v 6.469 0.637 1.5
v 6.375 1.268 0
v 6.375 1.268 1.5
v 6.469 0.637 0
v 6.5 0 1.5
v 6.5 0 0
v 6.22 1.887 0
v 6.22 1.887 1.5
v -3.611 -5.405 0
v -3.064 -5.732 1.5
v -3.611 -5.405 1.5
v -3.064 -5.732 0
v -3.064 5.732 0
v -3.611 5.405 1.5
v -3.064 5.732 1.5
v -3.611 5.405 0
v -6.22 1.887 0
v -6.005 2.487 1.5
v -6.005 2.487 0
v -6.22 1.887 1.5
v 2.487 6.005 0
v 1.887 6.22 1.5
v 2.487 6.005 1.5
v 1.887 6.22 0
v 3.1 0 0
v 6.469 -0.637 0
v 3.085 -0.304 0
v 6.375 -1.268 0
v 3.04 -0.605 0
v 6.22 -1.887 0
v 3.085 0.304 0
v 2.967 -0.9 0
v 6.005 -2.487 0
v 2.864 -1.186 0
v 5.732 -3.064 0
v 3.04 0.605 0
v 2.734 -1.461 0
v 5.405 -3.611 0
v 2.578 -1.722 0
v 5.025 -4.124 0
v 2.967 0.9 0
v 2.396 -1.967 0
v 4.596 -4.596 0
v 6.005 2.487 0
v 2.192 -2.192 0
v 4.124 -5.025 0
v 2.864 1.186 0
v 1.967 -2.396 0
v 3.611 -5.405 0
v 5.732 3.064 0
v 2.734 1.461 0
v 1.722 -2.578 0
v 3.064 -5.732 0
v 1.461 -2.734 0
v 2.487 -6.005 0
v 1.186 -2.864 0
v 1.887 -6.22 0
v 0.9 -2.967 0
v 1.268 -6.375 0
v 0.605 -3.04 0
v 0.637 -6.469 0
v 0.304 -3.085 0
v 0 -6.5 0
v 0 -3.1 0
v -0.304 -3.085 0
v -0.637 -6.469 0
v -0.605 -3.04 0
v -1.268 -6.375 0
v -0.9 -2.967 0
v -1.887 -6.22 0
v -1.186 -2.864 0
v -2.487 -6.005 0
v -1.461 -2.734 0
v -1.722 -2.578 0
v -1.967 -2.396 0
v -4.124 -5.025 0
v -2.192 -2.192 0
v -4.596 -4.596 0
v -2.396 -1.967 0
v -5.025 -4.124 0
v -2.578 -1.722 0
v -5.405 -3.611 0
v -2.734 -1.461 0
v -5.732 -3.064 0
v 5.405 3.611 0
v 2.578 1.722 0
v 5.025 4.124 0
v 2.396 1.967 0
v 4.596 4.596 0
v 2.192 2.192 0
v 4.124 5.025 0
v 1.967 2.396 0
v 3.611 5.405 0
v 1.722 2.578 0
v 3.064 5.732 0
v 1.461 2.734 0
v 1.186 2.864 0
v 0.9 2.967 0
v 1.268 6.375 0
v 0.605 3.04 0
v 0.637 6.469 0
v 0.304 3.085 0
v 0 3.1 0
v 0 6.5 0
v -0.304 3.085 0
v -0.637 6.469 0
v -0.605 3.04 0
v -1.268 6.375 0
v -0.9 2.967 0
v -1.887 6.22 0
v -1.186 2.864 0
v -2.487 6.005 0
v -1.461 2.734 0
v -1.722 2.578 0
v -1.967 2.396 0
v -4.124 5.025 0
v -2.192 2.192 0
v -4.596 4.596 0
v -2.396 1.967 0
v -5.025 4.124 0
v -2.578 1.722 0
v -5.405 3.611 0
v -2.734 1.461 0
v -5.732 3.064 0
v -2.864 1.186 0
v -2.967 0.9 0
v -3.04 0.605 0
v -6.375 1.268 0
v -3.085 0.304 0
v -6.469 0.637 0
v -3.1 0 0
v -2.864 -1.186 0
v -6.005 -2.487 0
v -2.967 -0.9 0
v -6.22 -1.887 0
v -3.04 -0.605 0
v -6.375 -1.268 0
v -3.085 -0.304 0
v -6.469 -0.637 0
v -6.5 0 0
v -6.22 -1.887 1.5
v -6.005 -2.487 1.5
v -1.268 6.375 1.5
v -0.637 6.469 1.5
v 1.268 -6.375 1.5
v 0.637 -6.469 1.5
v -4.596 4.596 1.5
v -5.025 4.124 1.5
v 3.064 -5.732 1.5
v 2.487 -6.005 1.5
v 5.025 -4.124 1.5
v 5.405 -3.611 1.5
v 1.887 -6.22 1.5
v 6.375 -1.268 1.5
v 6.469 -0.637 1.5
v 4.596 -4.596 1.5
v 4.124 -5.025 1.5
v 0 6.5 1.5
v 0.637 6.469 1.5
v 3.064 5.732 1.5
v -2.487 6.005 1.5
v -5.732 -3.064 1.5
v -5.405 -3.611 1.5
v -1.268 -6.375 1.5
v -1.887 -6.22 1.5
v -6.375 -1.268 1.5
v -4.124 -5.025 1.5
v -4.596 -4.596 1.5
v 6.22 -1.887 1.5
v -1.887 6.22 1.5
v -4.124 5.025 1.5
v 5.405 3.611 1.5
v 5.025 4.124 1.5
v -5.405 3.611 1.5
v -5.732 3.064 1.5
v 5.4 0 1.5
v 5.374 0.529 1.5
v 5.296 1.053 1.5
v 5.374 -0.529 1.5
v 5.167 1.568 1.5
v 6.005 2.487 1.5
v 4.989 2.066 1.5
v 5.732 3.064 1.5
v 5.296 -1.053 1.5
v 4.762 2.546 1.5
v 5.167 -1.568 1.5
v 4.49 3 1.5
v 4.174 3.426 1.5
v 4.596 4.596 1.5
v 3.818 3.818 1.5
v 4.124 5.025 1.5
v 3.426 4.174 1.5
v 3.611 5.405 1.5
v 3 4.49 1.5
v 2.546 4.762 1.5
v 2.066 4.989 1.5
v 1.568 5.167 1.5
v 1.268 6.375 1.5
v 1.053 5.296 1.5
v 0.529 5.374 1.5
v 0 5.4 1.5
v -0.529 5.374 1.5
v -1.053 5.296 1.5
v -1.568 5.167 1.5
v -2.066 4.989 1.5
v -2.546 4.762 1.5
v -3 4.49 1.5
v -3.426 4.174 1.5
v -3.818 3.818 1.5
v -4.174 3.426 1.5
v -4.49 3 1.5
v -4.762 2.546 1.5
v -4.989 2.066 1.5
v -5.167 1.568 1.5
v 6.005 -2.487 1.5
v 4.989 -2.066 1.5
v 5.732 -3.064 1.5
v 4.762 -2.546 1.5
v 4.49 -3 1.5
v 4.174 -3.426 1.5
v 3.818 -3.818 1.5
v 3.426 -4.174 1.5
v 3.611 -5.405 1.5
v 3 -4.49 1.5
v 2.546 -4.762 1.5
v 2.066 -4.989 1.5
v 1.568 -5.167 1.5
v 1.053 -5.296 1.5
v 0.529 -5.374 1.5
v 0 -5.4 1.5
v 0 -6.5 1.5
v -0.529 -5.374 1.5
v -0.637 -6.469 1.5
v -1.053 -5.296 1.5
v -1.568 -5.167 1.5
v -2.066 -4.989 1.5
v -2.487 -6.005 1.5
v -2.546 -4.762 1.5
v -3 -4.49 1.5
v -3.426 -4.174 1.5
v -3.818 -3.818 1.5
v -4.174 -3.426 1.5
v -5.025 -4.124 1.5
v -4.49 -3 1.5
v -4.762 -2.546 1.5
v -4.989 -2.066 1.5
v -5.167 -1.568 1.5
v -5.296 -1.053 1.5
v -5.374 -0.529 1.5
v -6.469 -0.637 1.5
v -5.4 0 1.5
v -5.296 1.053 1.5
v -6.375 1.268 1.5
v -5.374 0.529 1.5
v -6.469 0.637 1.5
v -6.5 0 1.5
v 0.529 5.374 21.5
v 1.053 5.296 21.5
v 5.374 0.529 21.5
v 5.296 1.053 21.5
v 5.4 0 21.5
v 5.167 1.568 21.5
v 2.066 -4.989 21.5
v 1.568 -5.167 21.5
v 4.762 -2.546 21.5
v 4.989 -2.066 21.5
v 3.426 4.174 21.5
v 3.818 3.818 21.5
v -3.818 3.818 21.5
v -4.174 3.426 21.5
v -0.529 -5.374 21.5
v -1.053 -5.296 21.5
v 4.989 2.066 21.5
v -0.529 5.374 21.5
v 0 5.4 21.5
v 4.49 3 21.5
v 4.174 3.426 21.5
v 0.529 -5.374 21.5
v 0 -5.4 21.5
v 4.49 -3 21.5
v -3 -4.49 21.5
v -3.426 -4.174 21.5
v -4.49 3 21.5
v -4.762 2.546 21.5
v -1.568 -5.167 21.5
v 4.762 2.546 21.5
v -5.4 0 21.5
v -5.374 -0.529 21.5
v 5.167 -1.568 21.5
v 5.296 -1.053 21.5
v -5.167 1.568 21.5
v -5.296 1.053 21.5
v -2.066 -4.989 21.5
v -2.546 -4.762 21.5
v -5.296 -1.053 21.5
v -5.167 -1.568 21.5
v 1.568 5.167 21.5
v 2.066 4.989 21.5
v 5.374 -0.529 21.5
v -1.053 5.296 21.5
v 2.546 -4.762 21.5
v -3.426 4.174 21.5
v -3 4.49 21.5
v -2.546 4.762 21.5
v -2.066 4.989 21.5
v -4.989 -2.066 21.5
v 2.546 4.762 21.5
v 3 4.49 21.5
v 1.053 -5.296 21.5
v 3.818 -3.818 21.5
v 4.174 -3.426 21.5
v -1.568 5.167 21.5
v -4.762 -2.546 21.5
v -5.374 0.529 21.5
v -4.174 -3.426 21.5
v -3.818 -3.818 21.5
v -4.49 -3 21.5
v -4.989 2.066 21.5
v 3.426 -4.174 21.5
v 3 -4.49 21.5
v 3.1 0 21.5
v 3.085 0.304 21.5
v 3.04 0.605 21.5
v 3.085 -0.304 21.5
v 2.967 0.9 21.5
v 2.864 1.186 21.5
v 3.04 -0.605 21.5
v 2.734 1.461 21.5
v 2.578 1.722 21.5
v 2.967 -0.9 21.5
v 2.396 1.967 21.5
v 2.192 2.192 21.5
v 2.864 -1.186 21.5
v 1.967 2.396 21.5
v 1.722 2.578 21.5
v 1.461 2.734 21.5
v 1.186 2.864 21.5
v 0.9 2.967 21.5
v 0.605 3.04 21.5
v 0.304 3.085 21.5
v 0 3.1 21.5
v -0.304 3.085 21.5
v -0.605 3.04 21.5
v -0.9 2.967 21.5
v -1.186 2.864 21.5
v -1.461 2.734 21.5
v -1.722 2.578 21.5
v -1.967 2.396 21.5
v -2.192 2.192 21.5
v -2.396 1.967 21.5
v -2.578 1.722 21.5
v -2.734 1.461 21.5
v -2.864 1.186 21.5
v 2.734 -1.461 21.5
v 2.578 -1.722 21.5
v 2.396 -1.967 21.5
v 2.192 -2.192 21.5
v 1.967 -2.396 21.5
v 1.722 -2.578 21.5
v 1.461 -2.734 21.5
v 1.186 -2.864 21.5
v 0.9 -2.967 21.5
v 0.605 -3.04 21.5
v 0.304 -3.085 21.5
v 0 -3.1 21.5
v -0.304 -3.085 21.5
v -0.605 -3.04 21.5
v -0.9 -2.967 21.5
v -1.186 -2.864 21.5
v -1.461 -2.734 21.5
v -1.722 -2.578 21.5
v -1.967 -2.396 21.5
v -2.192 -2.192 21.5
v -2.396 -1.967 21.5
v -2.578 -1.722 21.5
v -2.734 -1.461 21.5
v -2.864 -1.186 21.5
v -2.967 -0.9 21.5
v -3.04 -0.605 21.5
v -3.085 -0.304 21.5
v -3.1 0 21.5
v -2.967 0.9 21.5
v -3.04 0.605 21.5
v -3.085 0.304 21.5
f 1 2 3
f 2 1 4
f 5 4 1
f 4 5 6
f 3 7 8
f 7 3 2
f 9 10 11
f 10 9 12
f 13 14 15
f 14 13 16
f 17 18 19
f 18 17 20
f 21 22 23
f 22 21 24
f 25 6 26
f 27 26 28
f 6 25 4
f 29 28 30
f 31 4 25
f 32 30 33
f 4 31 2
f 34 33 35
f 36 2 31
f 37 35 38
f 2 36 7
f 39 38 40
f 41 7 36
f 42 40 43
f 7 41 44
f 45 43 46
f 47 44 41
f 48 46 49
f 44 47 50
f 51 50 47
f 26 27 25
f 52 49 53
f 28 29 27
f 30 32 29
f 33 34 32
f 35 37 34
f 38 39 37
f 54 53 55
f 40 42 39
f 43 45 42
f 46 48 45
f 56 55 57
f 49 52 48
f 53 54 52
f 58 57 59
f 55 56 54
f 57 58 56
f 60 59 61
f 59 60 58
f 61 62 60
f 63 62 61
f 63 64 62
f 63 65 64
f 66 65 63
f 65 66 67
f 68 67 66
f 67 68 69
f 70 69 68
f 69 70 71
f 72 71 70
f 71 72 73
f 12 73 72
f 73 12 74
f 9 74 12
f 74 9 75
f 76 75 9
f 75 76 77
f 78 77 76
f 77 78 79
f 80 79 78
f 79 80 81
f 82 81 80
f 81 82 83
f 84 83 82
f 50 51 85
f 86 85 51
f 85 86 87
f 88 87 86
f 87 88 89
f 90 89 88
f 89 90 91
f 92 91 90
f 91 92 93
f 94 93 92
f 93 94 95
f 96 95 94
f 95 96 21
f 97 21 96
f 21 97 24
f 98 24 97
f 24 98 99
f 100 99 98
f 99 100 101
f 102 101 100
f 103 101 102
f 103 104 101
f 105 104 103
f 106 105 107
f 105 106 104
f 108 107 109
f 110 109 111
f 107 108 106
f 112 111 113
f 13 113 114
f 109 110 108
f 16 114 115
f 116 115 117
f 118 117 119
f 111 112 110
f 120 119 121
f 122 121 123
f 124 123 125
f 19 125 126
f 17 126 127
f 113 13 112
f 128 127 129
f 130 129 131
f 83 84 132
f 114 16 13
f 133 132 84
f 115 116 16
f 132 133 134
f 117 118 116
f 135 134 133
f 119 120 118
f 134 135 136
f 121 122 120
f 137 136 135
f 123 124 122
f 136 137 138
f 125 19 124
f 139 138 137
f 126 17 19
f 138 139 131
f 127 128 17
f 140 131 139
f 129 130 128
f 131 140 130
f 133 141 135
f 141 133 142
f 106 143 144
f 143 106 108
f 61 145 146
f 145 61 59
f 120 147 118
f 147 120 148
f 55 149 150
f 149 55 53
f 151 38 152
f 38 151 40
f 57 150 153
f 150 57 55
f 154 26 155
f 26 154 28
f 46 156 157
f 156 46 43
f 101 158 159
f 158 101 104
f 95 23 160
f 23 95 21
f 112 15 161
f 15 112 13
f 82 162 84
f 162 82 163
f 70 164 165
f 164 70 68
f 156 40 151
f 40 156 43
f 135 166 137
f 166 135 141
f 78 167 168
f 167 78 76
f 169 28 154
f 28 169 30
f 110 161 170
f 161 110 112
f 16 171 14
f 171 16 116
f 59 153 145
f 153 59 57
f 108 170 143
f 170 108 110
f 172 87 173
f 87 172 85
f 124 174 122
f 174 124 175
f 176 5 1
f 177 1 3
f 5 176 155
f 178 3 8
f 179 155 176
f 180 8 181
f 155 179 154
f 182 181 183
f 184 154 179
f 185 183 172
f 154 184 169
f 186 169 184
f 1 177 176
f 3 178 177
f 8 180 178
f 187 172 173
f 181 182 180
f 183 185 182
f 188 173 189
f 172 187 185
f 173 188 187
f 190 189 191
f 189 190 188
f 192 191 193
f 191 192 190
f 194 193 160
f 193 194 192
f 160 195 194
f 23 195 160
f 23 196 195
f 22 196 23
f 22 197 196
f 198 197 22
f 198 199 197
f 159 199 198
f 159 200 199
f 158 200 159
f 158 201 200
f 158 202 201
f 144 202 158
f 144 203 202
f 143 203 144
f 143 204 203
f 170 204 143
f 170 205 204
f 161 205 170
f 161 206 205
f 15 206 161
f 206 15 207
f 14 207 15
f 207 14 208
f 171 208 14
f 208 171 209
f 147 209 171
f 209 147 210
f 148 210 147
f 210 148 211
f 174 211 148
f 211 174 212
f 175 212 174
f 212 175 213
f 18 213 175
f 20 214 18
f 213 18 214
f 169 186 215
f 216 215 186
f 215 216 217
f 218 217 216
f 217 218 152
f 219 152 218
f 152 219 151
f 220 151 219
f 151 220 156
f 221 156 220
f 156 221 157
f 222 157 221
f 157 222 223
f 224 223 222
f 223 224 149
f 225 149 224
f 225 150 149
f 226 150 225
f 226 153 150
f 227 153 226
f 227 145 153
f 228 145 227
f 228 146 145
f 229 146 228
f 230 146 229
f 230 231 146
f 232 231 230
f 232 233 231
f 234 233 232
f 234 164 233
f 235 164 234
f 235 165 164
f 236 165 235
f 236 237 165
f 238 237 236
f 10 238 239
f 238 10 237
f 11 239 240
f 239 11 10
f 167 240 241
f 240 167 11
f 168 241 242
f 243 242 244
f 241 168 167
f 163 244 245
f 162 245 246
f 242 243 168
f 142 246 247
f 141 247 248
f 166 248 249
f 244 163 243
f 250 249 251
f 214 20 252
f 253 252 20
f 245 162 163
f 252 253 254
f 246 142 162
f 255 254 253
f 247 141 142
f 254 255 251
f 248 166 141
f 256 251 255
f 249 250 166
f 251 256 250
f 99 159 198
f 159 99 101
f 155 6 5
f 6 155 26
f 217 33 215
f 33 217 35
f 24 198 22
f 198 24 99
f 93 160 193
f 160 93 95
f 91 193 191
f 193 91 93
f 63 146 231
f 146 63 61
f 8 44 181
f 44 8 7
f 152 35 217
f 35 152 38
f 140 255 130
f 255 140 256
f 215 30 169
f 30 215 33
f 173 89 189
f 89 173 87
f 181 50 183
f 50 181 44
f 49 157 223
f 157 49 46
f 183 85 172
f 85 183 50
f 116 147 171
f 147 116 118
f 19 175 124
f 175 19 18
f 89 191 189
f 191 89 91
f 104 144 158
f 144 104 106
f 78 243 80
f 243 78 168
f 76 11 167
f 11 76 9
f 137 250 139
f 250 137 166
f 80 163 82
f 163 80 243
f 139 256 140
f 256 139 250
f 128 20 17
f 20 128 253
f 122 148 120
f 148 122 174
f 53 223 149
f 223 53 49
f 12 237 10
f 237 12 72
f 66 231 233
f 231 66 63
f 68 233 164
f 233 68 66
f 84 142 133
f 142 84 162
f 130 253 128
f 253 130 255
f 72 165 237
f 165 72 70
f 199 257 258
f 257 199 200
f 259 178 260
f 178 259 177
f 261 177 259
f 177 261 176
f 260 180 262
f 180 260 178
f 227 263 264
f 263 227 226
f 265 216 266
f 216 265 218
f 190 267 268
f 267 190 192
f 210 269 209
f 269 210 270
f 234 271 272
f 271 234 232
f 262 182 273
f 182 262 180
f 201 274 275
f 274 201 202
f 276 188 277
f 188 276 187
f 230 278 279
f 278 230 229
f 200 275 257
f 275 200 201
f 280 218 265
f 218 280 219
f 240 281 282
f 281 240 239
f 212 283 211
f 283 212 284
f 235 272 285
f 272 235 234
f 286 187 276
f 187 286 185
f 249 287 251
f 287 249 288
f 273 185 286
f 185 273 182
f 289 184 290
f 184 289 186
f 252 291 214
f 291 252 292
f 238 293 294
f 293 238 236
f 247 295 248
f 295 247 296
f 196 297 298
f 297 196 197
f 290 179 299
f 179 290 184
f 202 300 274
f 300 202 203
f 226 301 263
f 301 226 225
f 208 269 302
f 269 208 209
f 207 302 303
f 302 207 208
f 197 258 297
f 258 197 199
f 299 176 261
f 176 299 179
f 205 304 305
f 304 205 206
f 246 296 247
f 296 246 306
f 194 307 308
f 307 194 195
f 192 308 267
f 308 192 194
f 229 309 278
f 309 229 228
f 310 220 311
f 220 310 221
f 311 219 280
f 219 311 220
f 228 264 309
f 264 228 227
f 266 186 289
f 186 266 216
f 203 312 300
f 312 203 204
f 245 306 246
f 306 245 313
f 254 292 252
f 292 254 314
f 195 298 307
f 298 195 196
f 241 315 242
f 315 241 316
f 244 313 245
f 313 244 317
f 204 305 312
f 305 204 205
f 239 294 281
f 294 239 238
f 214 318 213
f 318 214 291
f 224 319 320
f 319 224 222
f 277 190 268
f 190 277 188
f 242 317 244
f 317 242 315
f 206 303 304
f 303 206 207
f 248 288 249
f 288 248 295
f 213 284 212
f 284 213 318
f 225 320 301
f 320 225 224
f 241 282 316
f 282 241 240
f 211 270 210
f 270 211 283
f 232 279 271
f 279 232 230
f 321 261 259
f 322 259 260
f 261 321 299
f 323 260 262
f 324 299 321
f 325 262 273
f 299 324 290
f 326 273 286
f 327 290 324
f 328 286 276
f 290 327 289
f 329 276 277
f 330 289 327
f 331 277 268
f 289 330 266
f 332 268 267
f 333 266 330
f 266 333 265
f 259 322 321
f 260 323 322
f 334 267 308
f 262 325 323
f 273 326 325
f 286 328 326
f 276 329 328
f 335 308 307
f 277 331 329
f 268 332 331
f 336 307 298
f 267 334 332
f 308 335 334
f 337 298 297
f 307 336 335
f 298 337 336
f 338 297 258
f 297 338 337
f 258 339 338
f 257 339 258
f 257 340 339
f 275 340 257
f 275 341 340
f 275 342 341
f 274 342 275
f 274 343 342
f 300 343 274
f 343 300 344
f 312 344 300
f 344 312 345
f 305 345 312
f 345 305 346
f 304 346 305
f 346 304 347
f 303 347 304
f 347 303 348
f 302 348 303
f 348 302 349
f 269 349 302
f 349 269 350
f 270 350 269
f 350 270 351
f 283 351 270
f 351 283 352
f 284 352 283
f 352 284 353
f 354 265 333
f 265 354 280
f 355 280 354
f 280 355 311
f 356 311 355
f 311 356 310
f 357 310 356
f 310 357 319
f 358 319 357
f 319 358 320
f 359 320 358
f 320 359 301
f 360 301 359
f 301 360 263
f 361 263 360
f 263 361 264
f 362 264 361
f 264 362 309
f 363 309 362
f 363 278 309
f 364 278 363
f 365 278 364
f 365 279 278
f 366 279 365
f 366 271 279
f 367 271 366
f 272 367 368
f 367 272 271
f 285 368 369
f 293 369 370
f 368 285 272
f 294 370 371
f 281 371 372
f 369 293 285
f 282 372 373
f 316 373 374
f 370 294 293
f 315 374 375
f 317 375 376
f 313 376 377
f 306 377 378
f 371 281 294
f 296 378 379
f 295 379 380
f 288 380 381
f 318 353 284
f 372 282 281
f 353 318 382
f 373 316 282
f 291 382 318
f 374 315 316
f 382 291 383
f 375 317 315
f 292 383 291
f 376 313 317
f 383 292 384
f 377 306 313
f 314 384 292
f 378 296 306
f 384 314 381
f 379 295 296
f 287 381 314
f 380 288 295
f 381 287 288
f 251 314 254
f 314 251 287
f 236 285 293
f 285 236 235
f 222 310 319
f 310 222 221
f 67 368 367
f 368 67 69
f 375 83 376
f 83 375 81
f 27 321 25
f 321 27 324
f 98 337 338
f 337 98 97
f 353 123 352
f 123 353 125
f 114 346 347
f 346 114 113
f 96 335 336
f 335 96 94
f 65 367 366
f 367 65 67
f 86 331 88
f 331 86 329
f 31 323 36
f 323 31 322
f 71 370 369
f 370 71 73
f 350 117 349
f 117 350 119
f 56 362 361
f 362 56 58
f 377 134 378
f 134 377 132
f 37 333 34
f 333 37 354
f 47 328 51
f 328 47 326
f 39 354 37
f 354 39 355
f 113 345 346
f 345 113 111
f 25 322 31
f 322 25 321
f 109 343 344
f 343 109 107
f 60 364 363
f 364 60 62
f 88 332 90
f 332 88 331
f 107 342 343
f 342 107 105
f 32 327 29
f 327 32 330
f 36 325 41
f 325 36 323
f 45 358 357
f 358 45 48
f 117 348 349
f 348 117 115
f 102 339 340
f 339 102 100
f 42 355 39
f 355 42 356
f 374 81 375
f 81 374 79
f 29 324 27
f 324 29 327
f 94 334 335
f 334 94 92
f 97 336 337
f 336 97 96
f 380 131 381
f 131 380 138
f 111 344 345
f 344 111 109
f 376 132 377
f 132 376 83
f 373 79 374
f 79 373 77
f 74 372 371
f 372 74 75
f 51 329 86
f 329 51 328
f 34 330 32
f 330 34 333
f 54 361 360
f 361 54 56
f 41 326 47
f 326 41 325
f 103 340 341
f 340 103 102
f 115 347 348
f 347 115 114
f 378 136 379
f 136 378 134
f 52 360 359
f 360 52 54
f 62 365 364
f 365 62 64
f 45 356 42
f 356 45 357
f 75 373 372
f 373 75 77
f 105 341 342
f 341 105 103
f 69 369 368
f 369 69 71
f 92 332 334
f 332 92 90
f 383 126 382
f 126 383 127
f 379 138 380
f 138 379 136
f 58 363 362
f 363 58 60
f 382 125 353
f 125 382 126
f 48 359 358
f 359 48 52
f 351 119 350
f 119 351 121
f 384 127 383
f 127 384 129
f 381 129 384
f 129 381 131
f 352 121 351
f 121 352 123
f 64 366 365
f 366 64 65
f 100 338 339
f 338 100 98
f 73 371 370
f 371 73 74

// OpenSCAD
// --- Dimensions (mm) ---
collar_diameter = 13.0;      // Diameter of the base collar
collar_thickness = 1.5;      // Height of the base collar
sleeve_outer_diameter = 10.8; // Diameter of the main sleeve body
sleeve_height = 21.5;        // Total height from bottom of collar to top of sleeve
bore_diameter = 6.2;         // Diameter of the central hole

// --- Constants ---
$fn = 64; // Smoothness for cylinders

// --- Implementation ---

// The part is printed "upside down" relative to the user's description 
// of the collar being at z=0.
// The collar rests on the bed (z=0 to 1.5).
// The sleeve body rises from the collar to z=21.5.

module adapter_sleeve() {
    difference() {
        // Main Body (Union of collar and sleeve)
        union() {
            // Collar (Base)
            cylinder(h = collar_thickness, d = collar_diameter);
            
            // Sleeve Body
            // Note: The sleeve rises from the collar. 
            // Total height is 21.5. Since collar is 1.5, sleeve body height is 20.0.
            translate([0, 0, collar_thickness])
                cylinder(h = sleeve_height - collar_thickness, d = sleeve_outer_diameter);
        }

        // Central Bore (The hole running through the full height)
        // We extend the bore slightly beyond the top and bottom to ensure a clean cut.
        translate([0, 0, -1])
            cylinder(h = sleeve_height + 2, d = bore_diameter);
    }
}

// Render the part
adapter_sleeve();
